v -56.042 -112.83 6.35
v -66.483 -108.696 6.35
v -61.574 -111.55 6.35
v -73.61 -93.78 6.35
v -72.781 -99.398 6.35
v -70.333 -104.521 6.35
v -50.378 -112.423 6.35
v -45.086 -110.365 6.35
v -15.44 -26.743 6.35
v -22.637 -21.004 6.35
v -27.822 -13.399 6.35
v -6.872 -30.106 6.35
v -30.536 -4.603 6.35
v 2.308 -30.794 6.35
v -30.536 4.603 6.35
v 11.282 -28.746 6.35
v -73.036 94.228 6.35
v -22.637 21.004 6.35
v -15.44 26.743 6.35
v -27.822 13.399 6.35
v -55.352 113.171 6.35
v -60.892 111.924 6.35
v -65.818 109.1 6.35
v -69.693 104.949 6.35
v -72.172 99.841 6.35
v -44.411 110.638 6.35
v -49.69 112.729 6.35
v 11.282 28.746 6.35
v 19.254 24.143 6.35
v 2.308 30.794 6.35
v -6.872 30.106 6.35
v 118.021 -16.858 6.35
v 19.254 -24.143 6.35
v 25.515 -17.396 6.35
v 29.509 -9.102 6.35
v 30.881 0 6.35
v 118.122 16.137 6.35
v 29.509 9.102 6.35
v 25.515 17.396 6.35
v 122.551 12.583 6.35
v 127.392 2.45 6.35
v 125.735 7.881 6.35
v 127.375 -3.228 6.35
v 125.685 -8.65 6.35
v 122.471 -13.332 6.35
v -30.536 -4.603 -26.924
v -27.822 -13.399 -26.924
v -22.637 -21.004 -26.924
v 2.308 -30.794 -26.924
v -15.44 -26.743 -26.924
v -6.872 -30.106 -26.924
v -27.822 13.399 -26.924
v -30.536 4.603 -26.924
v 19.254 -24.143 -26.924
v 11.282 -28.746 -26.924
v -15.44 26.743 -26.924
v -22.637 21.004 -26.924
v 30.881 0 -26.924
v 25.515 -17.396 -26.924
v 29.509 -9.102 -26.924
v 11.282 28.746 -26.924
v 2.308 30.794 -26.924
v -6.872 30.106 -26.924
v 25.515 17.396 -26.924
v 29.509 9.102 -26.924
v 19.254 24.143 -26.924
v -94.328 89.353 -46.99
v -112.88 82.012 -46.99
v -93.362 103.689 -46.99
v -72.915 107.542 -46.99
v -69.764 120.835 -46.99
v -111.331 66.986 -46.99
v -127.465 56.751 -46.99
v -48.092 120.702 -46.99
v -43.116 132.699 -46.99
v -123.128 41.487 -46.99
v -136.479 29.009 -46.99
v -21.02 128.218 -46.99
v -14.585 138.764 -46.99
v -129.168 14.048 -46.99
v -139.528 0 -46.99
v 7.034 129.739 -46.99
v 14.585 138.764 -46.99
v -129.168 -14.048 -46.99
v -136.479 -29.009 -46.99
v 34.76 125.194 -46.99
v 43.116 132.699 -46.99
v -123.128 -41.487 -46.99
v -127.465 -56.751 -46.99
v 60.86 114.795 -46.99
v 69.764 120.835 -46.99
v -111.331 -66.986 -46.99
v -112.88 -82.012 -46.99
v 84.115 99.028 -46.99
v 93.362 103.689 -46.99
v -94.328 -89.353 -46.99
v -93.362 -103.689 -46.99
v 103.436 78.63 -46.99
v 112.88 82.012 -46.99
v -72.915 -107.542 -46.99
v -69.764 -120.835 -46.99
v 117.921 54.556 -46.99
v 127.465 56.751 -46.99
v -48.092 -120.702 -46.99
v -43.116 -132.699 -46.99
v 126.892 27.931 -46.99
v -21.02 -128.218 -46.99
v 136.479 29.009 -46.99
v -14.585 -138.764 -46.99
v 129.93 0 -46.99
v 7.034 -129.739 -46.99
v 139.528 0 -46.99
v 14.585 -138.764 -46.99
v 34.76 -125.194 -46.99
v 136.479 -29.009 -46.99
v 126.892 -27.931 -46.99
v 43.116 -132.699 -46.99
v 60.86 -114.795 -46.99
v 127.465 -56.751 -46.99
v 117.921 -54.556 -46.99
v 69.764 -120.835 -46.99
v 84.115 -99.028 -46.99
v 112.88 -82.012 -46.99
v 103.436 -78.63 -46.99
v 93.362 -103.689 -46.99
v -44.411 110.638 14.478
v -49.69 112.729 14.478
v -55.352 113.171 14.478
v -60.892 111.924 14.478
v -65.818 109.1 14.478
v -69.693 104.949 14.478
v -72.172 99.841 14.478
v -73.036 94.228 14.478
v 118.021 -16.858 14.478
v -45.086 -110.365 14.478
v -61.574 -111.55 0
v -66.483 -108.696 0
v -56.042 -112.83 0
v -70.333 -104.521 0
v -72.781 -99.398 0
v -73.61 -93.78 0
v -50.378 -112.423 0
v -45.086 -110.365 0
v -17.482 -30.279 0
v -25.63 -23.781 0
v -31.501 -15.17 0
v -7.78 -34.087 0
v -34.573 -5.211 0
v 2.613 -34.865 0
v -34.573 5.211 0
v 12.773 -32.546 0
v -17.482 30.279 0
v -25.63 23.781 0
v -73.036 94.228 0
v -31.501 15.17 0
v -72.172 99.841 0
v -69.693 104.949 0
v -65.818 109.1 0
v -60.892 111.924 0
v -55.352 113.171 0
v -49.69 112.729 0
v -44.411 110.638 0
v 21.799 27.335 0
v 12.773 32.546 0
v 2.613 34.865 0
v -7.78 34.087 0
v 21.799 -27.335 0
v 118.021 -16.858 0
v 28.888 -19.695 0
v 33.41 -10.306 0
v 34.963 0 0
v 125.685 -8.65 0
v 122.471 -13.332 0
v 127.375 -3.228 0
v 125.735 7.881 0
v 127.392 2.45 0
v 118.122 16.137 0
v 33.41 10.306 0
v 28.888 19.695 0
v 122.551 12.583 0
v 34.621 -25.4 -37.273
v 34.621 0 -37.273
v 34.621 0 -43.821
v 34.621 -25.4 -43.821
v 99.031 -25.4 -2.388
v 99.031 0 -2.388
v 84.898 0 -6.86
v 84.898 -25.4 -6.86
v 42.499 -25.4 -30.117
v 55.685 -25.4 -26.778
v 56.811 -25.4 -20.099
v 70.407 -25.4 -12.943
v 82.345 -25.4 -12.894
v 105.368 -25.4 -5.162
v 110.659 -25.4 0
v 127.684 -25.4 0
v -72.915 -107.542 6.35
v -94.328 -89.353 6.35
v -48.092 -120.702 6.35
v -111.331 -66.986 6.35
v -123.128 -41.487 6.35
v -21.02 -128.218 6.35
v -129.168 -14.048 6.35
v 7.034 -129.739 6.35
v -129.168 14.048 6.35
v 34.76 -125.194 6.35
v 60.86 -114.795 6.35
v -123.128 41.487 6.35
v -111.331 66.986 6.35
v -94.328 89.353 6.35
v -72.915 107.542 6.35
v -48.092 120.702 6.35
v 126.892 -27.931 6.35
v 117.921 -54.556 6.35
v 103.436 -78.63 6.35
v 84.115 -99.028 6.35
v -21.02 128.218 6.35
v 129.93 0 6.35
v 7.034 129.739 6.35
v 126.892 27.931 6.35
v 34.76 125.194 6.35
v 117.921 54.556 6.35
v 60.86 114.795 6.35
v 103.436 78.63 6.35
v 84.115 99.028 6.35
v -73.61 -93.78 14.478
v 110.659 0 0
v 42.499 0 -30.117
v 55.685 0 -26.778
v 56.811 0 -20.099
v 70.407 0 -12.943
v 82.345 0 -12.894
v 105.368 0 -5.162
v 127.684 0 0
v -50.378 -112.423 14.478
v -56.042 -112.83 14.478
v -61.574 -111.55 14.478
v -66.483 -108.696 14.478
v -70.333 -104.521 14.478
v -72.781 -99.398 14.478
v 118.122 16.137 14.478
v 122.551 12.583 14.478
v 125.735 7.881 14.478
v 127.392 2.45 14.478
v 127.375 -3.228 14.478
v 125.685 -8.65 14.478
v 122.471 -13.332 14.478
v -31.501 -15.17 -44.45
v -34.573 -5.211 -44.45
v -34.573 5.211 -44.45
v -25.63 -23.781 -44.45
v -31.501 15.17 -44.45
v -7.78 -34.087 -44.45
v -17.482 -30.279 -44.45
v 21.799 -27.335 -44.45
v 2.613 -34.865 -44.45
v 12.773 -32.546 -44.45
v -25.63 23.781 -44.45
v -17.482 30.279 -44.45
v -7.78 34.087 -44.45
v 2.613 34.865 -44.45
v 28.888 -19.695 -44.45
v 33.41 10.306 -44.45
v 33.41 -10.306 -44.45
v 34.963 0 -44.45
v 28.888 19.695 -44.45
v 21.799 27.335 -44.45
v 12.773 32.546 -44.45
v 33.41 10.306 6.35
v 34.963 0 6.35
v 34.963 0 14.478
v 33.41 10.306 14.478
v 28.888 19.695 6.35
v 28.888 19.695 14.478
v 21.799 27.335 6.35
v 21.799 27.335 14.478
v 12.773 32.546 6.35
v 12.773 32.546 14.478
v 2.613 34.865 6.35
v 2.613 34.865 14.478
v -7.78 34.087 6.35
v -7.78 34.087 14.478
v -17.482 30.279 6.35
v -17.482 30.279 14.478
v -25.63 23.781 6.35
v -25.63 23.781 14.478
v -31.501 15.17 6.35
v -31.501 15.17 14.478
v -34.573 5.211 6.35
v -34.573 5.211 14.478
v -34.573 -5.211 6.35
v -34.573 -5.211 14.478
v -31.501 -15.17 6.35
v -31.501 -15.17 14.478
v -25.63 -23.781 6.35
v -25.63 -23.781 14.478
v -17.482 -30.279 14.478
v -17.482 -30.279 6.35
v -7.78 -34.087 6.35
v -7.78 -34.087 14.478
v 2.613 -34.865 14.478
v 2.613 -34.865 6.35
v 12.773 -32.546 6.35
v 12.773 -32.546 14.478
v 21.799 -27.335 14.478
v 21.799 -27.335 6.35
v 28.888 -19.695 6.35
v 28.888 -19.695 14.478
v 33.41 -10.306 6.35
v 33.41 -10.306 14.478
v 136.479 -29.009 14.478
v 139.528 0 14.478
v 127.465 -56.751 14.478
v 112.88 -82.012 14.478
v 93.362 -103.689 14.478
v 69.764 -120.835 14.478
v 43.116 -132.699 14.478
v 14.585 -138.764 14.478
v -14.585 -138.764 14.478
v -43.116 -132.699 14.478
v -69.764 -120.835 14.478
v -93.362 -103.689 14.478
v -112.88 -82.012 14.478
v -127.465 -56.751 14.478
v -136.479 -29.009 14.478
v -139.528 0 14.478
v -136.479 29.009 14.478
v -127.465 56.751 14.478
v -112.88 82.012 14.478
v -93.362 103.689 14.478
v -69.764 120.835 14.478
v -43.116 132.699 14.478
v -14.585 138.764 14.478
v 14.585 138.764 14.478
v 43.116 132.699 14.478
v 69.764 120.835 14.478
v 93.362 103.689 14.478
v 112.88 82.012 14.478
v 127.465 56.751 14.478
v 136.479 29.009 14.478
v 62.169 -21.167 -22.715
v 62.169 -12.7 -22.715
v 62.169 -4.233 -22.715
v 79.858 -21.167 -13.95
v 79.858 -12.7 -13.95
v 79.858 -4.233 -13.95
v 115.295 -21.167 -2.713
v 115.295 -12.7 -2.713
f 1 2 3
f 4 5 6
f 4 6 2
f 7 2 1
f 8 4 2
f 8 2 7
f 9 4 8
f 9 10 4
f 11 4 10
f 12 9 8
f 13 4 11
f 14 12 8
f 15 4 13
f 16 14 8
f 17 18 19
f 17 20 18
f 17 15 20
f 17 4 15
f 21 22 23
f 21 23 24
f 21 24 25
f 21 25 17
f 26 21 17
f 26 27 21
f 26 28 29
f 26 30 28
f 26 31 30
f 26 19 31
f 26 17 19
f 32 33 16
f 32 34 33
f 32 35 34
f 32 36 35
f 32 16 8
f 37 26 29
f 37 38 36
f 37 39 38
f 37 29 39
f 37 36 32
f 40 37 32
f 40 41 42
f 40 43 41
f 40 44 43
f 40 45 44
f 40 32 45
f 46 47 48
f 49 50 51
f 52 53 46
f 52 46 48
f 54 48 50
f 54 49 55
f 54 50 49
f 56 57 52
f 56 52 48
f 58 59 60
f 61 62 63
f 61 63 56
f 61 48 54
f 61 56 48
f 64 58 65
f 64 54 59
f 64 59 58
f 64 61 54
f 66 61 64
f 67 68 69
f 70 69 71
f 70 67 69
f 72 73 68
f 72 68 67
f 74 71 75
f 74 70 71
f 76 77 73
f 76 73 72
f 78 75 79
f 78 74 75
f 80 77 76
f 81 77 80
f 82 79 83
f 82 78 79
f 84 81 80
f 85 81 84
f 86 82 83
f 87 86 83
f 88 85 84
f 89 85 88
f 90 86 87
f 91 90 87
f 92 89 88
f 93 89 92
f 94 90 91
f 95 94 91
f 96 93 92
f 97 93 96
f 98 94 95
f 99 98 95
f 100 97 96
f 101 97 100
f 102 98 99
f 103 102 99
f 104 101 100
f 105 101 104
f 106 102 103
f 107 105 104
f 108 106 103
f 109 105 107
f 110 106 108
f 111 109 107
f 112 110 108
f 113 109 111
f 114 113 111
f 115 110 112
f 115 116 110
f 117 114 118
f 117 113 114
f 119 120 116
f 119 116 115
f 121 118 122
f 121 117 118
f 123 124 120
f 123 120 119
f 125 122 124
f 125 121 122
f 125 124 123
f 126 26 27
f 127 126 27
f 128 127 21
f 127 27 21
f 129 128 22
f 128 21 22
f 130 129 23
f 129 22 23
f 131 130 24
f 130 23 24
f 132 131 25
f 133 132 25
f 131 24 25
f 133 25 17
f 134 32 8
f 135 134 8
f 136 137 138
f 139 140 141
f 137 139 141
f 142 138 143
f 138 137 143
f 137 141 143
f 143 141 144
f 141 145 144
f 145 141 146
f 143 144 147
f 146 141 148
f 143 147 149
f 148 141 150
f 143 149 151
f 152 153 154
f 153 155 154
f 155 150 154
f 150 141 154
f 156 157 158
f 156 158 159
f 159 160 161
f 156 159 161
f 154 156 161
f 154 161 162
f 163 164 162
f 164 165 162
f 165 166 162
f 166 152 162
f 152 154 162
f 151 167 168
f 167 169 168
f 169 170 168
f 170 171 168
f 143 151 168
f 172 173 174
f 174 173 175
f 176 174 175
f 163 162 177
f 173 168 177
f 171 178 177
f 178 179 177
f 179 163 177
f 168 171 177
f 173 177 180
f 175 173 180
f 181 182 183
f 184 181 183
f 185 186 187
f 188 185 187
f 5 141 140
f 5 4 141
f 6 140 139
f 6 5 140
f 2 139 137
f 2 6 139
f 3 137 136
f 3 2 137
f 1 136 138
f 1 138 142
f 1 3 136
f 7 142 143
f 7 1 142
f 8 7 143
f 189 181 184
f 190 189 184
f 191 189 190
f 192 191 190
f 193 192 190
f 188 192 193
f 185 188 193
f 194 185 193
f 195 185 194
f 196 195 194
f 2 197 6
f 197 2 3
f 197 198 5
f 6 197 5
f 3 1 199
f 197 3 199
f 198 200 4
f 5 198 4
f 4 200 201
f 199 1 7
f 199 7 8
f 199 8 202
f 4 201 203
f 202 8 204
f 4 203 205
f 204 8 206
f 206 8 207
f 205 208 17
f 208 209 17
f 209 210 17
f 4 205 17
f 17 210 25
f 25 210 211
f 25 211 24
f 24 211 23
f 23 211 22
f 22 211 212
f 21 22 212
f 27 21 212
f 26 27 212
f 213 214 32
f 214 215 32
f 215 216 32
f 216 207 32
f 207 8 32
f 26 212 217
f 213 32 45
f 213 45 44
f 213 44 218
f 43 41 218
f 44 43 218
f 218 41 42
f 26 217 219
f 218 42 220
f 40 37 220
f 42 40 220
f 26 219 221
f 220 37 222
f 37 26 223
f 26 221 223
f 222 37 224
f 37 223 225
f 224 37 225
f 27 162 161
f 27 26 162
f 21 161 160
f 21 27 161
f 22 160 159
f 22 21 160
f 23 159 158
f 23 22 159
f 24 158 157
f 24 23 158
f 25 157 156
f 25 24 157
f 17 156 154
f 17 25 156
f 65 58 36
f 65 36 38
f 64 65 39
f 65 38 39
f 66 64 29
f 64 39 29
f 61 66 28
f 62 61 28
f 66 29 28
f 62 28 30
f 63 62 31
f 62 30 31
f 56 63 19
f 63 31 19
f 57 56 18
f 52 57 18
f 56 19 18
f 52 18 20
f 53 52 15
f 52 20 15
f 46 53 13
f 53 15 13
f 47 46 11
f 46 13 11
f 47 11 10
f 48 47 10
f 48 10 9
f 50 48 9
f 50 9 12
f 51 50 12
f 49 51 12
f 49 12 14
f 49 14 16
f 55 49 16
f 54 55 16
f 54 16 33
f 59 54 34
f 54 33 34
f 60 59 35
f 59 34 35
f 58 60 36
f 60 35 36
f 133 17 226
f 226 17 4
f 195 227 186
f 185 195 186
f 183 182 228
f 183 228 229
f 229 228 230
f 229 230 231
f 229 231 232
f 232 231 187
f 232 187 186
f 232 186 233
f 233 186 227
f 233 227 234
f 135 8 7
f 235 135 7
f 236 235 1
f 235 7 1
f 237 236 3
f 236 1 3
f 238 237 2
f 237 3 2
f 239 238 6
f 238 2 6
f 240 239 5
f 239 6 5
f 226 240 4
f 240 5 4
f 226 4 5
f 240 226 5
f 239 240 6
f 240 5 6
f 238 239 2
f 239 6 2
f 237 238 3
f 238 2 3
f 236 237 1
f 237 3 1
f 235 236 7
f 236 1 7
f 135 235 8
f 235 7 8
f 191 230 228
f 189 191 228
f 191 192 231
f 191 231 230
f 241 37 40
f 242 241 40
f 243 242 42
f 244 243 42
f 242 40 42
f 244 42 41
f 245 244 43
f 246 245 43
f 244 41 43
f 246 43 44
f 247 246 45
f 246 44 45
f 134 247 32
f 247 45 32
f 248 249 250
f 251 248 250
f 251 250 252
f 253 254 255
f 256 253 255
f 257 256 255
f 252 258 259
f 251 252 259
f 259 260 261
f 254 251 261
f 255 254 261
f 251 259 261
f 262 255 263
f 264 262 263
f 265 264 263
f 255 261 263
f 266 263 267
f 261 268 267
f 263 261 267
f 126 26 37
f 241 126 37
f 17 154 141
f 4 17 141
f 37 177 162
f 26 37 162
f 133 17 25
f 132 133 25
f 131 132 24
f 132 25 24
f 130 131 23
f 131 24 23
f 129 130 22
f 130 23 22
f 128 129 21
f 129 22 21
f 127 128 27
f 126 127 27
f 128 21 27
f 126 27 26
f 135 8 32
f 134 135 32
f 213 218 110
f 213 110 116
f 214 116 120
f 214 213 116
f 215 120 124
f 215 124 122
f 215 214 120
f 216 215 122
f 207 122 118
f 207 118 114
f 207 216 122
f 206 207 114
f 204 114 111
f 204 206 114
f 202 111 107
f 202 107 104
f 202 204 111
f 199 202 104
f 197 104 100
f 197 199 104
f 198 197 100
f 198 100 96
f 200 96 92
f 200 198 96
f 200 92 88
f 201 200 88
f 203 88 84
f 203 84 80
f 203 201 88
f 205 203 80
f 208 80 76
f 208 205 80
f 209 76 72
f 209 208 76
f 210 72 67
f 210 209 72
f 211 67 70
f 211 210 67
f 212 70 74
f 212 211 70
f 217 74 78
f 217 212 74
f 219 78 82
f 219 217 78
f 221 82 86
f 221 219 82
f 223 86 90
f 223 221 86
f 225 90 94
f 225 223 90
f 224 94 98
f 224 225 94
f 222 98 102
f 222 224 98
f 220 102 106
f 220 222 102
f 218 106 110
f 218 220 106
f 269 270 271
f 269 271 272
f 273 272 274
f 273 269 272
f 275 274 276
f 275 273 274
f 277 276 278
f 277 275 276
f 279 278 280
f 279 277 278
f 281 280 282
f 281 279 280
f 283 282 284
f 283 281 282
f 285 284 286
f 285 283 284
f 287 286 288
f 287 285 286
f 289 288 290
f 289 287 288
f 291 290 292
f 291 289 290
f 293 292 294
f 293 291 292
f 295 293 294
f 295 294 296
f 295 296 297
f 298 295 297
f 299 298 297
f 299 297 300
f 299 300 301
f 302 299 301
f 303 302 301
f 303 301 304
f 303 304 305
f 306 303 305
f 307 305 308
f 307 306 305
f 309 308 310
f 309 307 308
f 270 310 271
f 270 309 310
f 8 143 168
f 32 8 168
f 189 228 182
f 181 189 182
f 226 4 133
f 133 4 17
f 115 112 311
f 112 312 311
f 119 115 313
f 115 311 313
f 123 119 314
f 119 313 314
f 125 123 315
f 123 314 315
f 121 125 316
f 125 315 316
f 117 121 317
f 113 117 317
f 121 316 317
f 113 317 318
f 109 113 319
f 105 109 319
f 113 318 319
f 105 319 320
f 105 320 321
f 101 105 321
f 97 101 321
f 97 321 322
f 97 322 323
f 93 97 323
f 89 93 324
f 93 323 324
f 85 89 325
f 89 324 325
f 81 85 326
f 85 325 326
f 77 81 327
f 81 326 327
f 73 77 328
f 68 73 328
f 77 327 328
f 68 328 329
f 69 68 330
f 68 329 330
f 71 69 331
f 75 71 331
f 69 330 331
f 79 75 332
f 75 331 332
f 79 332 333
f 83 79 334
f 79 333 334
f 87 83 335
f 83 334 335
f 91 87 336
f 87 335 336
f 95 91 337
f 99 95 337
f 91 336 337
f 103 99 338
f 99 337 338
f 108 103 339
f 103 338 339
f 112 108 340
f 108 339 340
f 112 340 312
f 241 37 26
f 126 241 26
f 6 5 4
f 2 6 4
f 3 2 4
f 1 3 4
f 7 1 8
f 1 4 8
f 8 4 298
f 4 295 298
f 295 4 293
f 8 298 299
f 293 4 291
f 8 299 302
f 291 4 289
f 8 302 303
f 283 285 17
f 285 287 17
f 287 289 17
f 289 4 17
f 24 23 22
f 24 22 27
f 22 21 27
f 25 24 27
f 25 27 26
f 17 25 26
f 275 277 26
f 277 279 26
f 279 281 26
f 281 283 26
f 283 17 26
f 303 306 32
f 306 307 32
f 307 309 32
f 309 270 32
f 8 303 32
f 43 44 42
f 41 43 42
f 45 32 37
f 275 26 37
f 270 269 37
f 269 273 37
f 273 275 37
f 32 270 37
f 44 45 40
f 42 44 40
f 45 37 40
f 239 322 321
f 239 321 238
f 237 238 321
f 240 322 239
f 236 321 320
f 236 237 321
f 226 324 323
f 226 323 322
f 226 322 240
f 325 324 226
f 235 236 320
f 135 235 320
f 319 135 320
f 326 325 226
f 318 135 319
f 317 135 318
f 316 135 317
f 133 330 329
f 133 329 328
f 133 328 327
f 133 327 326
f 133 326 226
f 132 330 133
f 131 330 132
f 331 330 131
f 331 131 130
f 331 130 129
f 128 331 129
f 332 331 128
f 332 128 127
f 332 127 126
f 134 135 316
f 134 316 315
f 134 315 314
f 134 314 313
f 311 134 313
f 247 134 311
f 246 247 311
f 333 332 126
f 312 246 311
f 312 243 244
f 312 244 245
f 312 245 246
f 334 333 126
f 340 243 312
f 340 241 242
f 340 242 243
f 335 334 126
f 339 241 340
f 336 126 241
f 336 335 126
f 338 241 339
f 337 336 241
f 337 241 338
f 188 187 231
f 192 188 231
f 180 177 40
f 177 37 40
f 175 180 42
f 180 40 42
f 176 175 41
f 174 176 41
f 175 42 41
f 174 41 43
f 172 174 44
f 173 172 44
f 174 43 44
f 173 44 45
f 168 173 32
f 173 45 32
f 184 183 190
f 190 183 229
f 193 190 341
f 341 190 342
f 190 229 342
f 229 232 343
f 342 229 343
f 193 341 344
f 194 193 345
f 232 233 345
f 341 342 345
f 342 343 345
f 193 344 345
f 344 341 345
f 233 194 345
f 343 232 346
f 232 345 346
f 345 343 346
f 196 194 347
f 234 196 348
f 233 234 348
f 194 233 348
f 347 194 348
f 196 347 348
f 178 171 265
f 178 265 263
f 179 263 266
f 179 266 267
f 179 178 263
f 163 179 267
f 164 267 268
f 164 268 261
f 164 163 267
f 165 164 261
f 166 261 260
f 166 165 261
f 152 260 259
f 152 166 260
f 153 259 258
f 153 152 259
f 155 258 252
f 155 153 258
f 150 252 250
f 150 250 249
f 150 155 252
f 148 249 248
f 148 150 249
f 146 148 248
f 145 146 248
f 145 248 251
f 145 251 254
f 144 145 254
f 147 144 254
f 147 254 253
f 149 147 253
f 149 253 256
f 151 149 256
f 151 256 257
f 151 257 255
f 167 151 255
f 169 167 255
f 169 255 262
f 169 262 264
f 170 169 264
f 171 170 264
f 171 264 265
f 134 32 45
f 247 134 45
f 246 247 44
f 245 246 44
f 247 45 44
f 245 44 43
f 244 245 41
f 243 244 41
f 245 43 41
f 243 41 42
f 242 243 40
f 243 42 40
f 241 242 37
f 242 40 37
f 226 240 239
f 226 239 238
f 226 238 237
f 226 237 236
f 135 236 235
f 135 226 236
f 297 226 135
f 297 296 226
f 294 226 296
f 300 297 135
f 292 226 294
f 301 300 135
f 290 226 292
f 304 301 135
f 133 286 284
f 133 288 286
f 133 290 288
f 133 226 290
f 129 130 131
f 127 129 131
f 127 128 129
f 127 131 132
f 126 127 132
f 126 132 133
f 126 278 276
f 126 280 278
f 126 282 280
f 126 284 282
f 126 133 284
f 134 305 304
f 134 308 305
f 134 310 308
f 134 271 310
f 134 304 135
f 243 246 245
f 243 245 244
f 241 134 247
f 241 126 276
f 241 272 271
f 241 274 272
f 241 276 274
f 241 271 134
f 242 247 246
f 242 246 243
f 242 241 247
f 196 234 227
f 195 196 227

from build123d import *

# Parameters (mm, degrees)
F1_DEPTH  = 6.35
F2_R      = 19.05
F3_R      = 34.9631
F4_DEPTH  = 50.8
F5_R      = 30.8806200816
F6_DEPTH  = 33.274
F7_R      = 139.5279160075
F8_DEPTH  = 8.128
F9_R      = 139.5279160075
F9_R_2    = 129.9298488658
F10_DEPTH = 53.34
F12_DEPTH = 25.4


with BuildPart() as f1:
    # F0 (on Top) → F1 (new body)
    with BuildSketch(Plane.XY):
        Polygon((146.6462837719, -0.448095108), (-72.9350801391, 127.223454671), (-73.7112036328, -126.7753595631), align=None)
    extrude(amount=F1_DEPTH)

    # F2
    f2_edges = [f1.edges().sort_by_distance(p)[0] for p in [
        (-73.711204, -126.77536, 3.175),
        (146.646284, -0.448095, 3.175),
        (-72.93508, 127.223455, 3.175),
    ]]
    fillet(f2_edges, radius=F2_R)

    # F3 (on face) → F4 (join)
    with BuildSketch(Plane.XY.offset(6.35)):
        Circle(F3_R)
    extrude(amount=-F4_DEPTH)

    # F5 (on face) → F6 (cut)
    with BuildSketch(Plane.XY.offset(6.35)):
        Circle(F5_R)
    extrude(amount=-F6_DEPTH, mode=Mode.SUBTRACT)


with BuildPart() as f8:
    # F7 (on face) → F8 (new body)
    with BuildSketch(Plane.XY.offset(6.35)):
        Circle(F7_R)
        with BuildLine():
            ThreePointArc((-45.0859263318, -110.3649665318), (-64.1358373993, -110.3067572697), (-73.6103822335, -93.7799457144))
            Line((-73.6103822335, -93.7799457144), (-73.0359015384, 94.2280408223))
            ThreePointArc((-73.0359015384, 94.2280408223), (-63.460535305, 110.6966431157), (-44.4106242375, 110.6384338537))
            Line((-44.4106242375, 110.6384338537), (118.1218278702, 16.1369257094))
            ThreePointArc((118.1218278702, 16.1369257094), (127.5963727043, -0.3898858459), (118.0210064709, -16.8584881393))
            Line((118.0210064709, -16.8584881393), (-45.0859263318, -110.3649665318))
        make_face(mode=Mode.SUBTRACT)
    extrude(amount=F8_DEPTH)

    # F9 (on face) → F10 (join)
    with BuildSketch(Plane(origin=(0, 0, 6.35), x_dir=(1, 0, 0), z_dir=(0, 0, -1))):
        Circle(F9_R)
        Circle(F9_R_2, mode=Mode.SUBTRACT)
    extrude(amount=F10_DEPTH)


with BuildPart() as f8b:
    # F3 (on face) → F8, piece 2 (new body)
    with BuildSketch(Plane.XY.offset(6.35)):
        with BuildLine():
            ThreePointArc((-73.6103822335, -93.7799457144), (-64.1358373993, -110.3067572697), (-45.0859263318, -110.3649665318))
            Line((-45.0859263318, -110.3649665318), (118.0210064709, -16.8584881393))
            ThreePointArc((118.0210064709, -16.8584881393), (127.5963727043, -0.3898858459), (118.1218278702, 16.1369257094))
            Line((118.1218278702, 16.1369257094), (-44.4106242375, 110.6384338537))
            ThreePointArc((-44.4106242375, 110.6384338537), (-63.460535305, 110.6966431157), (-73.0359015384, 94.2280408223))
            Line((-73.0359015384, 94.2280408223), (-73.6103822335, -93.7799457144))
        make_face()
        Circle(F3_R, mode=Mode.SUBTRACT)
    extrude(amount=F8_DEPTH)


with BuildPart() as f12:
    # F11 (on Front) → F12 (new body)
    with BuildSketch(Plane.XZ):
        with BuildLine():
            Line((34.6210598946, -37.2728966177), (34.6210598946, -43.8208505511))
            add(Edge.make_bspline(
                [(34.6210598946, -43.8208505511), (37.3424381489, -41.2618896861), (43.7113013136, -35.0810915616), (61.838248232, -22.0740891901), (79.8853194232, -13.7873170703), (93.0145748577, -8.5731682167), (114.9478485777, -2.325147559), (124.4112987954, -1.1166638659), (127.684161067, 0)],
                knots=[0, 0, 0, 0, 0.1411030038, 0.3321649049, 0.5111465769, 0.6645423113, 0.8565416151, 1, 1, 1, 1], degree=3))
            Line((127.684161067, 0), (110.6588542461, 0))
            Line((110.6588542461, 0), (99.0305617452, -2.3880249355))
            Line((99.0305617452, -2.3880249355), (84.8977193236, -6.8604443222))
            Line((84.8977193236, -6.8604443222), (70.4070776701, -12.9429353401))
            Line((70.4070776701, -12.9429353401), (56.8109229207, -20.0988072902))
            Line((56.8109229207, -20.0988072902), (42.4991808832, -30.1170255989))
            Line((42.4991808832, -30.1170255989), (34.6210598946, -37.2728966177))
        make_face()
    extrude(amount=F12_DEPTH)


solid = Compound([f1.part, f8.part, f8b.part, f12.part])
